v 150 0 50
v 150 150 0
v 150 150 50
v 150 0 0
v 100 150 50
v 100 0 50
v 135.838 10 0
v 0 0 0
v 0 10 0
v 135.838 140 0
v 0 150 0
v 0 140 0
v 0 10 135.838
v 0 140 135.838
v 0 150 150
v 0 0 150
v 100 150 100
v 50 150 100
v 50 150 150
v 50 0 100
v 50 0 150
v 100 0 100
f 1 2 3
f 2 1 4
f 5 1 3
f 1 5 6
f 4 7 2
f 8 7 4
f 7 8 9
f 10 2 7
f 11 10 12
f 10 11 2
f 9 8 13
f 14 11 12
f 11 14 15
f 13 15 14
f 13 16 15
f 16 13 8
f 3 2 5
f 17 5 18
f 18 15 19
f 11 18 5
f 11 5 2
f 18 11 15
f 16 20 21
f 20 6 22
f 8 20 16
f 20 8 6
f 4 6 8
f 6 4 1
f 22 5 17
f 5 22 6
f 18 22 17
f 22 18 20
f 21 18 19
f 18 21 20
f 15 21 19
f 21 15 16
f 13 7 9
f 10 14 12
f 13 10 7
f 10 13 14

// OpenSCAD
//Office Steps
//by: Brett Mattas
//date: March 22, 2019
//units: mm


//Description:
// Office steps without back or bottom

/////////////////////////////////////////////
/////////  PARAMETERS ///////////////////////
/////////////////////////////////////////////

//Global Parameters
$fn = 50; //Roundness parameter
// Arbitrary small number to avoid coincident faces
EPS = 0.01; 

L = 150; //Length
W = 150; //Width
H = 150; //Height
nSteps = 3; //Number of steps
t = 10; // Minimum thickness




/////////////////////////////////////////////
/////////  RENDERS //////////////////////////
/////////////////////////////////////////////

//Driver
Steps();




/////////////////////////////////////////////
/////////  FUNCTIONS ////////////////////////
/////////////////////////////////////////////

//Spherical Coordinates
function radius(x, y, z) = pow(pow(x,2)+pow(y,2)+pow(z,2),0.5);

/////////////////////////////////////////////
/////////  MODULES //////////////////////////
/////////////////////////////////////////////

module Steps()
{
    difference(){
        //Elements added
        union(){
            
            for (istep = [0:nSteps-1])
            {
                cube(size = [
                    (nSteps-istep)/nSteps*L,
                    W,
                    (istep+1)/nSteps*H
                ], center = false);
            }
            
        }
        
        //Elements removed
        union(){
            translate([L-EPS, t, -EPS])
                rotate([90, 0, 180])
                linear_extrude(
                        height=W-2*t,
                        center=false,
                        convexity=10
                        )
                CavityShape();
                    
        }
    }
}


module CavityShape()
{
    theta = atan(H/L);
    x1 = t/sin(theta);
    y1 = t/cos(theta);
    difference(){
        //Elements added
        union(){
        
            translate([0, 0, 0])
                polygon(points = [
                    [x1, 0],
                    [L, H-y1],
                    [L, 0]
                ]);
        }
        
        //Elements removed
        union(){
            
        }
    }
}

module TemplateModule()
{
    difference(){
        //Elements added
        union(){
        
            
        }
        
        //Elements removed
        union(){
            
        }
    }
}
